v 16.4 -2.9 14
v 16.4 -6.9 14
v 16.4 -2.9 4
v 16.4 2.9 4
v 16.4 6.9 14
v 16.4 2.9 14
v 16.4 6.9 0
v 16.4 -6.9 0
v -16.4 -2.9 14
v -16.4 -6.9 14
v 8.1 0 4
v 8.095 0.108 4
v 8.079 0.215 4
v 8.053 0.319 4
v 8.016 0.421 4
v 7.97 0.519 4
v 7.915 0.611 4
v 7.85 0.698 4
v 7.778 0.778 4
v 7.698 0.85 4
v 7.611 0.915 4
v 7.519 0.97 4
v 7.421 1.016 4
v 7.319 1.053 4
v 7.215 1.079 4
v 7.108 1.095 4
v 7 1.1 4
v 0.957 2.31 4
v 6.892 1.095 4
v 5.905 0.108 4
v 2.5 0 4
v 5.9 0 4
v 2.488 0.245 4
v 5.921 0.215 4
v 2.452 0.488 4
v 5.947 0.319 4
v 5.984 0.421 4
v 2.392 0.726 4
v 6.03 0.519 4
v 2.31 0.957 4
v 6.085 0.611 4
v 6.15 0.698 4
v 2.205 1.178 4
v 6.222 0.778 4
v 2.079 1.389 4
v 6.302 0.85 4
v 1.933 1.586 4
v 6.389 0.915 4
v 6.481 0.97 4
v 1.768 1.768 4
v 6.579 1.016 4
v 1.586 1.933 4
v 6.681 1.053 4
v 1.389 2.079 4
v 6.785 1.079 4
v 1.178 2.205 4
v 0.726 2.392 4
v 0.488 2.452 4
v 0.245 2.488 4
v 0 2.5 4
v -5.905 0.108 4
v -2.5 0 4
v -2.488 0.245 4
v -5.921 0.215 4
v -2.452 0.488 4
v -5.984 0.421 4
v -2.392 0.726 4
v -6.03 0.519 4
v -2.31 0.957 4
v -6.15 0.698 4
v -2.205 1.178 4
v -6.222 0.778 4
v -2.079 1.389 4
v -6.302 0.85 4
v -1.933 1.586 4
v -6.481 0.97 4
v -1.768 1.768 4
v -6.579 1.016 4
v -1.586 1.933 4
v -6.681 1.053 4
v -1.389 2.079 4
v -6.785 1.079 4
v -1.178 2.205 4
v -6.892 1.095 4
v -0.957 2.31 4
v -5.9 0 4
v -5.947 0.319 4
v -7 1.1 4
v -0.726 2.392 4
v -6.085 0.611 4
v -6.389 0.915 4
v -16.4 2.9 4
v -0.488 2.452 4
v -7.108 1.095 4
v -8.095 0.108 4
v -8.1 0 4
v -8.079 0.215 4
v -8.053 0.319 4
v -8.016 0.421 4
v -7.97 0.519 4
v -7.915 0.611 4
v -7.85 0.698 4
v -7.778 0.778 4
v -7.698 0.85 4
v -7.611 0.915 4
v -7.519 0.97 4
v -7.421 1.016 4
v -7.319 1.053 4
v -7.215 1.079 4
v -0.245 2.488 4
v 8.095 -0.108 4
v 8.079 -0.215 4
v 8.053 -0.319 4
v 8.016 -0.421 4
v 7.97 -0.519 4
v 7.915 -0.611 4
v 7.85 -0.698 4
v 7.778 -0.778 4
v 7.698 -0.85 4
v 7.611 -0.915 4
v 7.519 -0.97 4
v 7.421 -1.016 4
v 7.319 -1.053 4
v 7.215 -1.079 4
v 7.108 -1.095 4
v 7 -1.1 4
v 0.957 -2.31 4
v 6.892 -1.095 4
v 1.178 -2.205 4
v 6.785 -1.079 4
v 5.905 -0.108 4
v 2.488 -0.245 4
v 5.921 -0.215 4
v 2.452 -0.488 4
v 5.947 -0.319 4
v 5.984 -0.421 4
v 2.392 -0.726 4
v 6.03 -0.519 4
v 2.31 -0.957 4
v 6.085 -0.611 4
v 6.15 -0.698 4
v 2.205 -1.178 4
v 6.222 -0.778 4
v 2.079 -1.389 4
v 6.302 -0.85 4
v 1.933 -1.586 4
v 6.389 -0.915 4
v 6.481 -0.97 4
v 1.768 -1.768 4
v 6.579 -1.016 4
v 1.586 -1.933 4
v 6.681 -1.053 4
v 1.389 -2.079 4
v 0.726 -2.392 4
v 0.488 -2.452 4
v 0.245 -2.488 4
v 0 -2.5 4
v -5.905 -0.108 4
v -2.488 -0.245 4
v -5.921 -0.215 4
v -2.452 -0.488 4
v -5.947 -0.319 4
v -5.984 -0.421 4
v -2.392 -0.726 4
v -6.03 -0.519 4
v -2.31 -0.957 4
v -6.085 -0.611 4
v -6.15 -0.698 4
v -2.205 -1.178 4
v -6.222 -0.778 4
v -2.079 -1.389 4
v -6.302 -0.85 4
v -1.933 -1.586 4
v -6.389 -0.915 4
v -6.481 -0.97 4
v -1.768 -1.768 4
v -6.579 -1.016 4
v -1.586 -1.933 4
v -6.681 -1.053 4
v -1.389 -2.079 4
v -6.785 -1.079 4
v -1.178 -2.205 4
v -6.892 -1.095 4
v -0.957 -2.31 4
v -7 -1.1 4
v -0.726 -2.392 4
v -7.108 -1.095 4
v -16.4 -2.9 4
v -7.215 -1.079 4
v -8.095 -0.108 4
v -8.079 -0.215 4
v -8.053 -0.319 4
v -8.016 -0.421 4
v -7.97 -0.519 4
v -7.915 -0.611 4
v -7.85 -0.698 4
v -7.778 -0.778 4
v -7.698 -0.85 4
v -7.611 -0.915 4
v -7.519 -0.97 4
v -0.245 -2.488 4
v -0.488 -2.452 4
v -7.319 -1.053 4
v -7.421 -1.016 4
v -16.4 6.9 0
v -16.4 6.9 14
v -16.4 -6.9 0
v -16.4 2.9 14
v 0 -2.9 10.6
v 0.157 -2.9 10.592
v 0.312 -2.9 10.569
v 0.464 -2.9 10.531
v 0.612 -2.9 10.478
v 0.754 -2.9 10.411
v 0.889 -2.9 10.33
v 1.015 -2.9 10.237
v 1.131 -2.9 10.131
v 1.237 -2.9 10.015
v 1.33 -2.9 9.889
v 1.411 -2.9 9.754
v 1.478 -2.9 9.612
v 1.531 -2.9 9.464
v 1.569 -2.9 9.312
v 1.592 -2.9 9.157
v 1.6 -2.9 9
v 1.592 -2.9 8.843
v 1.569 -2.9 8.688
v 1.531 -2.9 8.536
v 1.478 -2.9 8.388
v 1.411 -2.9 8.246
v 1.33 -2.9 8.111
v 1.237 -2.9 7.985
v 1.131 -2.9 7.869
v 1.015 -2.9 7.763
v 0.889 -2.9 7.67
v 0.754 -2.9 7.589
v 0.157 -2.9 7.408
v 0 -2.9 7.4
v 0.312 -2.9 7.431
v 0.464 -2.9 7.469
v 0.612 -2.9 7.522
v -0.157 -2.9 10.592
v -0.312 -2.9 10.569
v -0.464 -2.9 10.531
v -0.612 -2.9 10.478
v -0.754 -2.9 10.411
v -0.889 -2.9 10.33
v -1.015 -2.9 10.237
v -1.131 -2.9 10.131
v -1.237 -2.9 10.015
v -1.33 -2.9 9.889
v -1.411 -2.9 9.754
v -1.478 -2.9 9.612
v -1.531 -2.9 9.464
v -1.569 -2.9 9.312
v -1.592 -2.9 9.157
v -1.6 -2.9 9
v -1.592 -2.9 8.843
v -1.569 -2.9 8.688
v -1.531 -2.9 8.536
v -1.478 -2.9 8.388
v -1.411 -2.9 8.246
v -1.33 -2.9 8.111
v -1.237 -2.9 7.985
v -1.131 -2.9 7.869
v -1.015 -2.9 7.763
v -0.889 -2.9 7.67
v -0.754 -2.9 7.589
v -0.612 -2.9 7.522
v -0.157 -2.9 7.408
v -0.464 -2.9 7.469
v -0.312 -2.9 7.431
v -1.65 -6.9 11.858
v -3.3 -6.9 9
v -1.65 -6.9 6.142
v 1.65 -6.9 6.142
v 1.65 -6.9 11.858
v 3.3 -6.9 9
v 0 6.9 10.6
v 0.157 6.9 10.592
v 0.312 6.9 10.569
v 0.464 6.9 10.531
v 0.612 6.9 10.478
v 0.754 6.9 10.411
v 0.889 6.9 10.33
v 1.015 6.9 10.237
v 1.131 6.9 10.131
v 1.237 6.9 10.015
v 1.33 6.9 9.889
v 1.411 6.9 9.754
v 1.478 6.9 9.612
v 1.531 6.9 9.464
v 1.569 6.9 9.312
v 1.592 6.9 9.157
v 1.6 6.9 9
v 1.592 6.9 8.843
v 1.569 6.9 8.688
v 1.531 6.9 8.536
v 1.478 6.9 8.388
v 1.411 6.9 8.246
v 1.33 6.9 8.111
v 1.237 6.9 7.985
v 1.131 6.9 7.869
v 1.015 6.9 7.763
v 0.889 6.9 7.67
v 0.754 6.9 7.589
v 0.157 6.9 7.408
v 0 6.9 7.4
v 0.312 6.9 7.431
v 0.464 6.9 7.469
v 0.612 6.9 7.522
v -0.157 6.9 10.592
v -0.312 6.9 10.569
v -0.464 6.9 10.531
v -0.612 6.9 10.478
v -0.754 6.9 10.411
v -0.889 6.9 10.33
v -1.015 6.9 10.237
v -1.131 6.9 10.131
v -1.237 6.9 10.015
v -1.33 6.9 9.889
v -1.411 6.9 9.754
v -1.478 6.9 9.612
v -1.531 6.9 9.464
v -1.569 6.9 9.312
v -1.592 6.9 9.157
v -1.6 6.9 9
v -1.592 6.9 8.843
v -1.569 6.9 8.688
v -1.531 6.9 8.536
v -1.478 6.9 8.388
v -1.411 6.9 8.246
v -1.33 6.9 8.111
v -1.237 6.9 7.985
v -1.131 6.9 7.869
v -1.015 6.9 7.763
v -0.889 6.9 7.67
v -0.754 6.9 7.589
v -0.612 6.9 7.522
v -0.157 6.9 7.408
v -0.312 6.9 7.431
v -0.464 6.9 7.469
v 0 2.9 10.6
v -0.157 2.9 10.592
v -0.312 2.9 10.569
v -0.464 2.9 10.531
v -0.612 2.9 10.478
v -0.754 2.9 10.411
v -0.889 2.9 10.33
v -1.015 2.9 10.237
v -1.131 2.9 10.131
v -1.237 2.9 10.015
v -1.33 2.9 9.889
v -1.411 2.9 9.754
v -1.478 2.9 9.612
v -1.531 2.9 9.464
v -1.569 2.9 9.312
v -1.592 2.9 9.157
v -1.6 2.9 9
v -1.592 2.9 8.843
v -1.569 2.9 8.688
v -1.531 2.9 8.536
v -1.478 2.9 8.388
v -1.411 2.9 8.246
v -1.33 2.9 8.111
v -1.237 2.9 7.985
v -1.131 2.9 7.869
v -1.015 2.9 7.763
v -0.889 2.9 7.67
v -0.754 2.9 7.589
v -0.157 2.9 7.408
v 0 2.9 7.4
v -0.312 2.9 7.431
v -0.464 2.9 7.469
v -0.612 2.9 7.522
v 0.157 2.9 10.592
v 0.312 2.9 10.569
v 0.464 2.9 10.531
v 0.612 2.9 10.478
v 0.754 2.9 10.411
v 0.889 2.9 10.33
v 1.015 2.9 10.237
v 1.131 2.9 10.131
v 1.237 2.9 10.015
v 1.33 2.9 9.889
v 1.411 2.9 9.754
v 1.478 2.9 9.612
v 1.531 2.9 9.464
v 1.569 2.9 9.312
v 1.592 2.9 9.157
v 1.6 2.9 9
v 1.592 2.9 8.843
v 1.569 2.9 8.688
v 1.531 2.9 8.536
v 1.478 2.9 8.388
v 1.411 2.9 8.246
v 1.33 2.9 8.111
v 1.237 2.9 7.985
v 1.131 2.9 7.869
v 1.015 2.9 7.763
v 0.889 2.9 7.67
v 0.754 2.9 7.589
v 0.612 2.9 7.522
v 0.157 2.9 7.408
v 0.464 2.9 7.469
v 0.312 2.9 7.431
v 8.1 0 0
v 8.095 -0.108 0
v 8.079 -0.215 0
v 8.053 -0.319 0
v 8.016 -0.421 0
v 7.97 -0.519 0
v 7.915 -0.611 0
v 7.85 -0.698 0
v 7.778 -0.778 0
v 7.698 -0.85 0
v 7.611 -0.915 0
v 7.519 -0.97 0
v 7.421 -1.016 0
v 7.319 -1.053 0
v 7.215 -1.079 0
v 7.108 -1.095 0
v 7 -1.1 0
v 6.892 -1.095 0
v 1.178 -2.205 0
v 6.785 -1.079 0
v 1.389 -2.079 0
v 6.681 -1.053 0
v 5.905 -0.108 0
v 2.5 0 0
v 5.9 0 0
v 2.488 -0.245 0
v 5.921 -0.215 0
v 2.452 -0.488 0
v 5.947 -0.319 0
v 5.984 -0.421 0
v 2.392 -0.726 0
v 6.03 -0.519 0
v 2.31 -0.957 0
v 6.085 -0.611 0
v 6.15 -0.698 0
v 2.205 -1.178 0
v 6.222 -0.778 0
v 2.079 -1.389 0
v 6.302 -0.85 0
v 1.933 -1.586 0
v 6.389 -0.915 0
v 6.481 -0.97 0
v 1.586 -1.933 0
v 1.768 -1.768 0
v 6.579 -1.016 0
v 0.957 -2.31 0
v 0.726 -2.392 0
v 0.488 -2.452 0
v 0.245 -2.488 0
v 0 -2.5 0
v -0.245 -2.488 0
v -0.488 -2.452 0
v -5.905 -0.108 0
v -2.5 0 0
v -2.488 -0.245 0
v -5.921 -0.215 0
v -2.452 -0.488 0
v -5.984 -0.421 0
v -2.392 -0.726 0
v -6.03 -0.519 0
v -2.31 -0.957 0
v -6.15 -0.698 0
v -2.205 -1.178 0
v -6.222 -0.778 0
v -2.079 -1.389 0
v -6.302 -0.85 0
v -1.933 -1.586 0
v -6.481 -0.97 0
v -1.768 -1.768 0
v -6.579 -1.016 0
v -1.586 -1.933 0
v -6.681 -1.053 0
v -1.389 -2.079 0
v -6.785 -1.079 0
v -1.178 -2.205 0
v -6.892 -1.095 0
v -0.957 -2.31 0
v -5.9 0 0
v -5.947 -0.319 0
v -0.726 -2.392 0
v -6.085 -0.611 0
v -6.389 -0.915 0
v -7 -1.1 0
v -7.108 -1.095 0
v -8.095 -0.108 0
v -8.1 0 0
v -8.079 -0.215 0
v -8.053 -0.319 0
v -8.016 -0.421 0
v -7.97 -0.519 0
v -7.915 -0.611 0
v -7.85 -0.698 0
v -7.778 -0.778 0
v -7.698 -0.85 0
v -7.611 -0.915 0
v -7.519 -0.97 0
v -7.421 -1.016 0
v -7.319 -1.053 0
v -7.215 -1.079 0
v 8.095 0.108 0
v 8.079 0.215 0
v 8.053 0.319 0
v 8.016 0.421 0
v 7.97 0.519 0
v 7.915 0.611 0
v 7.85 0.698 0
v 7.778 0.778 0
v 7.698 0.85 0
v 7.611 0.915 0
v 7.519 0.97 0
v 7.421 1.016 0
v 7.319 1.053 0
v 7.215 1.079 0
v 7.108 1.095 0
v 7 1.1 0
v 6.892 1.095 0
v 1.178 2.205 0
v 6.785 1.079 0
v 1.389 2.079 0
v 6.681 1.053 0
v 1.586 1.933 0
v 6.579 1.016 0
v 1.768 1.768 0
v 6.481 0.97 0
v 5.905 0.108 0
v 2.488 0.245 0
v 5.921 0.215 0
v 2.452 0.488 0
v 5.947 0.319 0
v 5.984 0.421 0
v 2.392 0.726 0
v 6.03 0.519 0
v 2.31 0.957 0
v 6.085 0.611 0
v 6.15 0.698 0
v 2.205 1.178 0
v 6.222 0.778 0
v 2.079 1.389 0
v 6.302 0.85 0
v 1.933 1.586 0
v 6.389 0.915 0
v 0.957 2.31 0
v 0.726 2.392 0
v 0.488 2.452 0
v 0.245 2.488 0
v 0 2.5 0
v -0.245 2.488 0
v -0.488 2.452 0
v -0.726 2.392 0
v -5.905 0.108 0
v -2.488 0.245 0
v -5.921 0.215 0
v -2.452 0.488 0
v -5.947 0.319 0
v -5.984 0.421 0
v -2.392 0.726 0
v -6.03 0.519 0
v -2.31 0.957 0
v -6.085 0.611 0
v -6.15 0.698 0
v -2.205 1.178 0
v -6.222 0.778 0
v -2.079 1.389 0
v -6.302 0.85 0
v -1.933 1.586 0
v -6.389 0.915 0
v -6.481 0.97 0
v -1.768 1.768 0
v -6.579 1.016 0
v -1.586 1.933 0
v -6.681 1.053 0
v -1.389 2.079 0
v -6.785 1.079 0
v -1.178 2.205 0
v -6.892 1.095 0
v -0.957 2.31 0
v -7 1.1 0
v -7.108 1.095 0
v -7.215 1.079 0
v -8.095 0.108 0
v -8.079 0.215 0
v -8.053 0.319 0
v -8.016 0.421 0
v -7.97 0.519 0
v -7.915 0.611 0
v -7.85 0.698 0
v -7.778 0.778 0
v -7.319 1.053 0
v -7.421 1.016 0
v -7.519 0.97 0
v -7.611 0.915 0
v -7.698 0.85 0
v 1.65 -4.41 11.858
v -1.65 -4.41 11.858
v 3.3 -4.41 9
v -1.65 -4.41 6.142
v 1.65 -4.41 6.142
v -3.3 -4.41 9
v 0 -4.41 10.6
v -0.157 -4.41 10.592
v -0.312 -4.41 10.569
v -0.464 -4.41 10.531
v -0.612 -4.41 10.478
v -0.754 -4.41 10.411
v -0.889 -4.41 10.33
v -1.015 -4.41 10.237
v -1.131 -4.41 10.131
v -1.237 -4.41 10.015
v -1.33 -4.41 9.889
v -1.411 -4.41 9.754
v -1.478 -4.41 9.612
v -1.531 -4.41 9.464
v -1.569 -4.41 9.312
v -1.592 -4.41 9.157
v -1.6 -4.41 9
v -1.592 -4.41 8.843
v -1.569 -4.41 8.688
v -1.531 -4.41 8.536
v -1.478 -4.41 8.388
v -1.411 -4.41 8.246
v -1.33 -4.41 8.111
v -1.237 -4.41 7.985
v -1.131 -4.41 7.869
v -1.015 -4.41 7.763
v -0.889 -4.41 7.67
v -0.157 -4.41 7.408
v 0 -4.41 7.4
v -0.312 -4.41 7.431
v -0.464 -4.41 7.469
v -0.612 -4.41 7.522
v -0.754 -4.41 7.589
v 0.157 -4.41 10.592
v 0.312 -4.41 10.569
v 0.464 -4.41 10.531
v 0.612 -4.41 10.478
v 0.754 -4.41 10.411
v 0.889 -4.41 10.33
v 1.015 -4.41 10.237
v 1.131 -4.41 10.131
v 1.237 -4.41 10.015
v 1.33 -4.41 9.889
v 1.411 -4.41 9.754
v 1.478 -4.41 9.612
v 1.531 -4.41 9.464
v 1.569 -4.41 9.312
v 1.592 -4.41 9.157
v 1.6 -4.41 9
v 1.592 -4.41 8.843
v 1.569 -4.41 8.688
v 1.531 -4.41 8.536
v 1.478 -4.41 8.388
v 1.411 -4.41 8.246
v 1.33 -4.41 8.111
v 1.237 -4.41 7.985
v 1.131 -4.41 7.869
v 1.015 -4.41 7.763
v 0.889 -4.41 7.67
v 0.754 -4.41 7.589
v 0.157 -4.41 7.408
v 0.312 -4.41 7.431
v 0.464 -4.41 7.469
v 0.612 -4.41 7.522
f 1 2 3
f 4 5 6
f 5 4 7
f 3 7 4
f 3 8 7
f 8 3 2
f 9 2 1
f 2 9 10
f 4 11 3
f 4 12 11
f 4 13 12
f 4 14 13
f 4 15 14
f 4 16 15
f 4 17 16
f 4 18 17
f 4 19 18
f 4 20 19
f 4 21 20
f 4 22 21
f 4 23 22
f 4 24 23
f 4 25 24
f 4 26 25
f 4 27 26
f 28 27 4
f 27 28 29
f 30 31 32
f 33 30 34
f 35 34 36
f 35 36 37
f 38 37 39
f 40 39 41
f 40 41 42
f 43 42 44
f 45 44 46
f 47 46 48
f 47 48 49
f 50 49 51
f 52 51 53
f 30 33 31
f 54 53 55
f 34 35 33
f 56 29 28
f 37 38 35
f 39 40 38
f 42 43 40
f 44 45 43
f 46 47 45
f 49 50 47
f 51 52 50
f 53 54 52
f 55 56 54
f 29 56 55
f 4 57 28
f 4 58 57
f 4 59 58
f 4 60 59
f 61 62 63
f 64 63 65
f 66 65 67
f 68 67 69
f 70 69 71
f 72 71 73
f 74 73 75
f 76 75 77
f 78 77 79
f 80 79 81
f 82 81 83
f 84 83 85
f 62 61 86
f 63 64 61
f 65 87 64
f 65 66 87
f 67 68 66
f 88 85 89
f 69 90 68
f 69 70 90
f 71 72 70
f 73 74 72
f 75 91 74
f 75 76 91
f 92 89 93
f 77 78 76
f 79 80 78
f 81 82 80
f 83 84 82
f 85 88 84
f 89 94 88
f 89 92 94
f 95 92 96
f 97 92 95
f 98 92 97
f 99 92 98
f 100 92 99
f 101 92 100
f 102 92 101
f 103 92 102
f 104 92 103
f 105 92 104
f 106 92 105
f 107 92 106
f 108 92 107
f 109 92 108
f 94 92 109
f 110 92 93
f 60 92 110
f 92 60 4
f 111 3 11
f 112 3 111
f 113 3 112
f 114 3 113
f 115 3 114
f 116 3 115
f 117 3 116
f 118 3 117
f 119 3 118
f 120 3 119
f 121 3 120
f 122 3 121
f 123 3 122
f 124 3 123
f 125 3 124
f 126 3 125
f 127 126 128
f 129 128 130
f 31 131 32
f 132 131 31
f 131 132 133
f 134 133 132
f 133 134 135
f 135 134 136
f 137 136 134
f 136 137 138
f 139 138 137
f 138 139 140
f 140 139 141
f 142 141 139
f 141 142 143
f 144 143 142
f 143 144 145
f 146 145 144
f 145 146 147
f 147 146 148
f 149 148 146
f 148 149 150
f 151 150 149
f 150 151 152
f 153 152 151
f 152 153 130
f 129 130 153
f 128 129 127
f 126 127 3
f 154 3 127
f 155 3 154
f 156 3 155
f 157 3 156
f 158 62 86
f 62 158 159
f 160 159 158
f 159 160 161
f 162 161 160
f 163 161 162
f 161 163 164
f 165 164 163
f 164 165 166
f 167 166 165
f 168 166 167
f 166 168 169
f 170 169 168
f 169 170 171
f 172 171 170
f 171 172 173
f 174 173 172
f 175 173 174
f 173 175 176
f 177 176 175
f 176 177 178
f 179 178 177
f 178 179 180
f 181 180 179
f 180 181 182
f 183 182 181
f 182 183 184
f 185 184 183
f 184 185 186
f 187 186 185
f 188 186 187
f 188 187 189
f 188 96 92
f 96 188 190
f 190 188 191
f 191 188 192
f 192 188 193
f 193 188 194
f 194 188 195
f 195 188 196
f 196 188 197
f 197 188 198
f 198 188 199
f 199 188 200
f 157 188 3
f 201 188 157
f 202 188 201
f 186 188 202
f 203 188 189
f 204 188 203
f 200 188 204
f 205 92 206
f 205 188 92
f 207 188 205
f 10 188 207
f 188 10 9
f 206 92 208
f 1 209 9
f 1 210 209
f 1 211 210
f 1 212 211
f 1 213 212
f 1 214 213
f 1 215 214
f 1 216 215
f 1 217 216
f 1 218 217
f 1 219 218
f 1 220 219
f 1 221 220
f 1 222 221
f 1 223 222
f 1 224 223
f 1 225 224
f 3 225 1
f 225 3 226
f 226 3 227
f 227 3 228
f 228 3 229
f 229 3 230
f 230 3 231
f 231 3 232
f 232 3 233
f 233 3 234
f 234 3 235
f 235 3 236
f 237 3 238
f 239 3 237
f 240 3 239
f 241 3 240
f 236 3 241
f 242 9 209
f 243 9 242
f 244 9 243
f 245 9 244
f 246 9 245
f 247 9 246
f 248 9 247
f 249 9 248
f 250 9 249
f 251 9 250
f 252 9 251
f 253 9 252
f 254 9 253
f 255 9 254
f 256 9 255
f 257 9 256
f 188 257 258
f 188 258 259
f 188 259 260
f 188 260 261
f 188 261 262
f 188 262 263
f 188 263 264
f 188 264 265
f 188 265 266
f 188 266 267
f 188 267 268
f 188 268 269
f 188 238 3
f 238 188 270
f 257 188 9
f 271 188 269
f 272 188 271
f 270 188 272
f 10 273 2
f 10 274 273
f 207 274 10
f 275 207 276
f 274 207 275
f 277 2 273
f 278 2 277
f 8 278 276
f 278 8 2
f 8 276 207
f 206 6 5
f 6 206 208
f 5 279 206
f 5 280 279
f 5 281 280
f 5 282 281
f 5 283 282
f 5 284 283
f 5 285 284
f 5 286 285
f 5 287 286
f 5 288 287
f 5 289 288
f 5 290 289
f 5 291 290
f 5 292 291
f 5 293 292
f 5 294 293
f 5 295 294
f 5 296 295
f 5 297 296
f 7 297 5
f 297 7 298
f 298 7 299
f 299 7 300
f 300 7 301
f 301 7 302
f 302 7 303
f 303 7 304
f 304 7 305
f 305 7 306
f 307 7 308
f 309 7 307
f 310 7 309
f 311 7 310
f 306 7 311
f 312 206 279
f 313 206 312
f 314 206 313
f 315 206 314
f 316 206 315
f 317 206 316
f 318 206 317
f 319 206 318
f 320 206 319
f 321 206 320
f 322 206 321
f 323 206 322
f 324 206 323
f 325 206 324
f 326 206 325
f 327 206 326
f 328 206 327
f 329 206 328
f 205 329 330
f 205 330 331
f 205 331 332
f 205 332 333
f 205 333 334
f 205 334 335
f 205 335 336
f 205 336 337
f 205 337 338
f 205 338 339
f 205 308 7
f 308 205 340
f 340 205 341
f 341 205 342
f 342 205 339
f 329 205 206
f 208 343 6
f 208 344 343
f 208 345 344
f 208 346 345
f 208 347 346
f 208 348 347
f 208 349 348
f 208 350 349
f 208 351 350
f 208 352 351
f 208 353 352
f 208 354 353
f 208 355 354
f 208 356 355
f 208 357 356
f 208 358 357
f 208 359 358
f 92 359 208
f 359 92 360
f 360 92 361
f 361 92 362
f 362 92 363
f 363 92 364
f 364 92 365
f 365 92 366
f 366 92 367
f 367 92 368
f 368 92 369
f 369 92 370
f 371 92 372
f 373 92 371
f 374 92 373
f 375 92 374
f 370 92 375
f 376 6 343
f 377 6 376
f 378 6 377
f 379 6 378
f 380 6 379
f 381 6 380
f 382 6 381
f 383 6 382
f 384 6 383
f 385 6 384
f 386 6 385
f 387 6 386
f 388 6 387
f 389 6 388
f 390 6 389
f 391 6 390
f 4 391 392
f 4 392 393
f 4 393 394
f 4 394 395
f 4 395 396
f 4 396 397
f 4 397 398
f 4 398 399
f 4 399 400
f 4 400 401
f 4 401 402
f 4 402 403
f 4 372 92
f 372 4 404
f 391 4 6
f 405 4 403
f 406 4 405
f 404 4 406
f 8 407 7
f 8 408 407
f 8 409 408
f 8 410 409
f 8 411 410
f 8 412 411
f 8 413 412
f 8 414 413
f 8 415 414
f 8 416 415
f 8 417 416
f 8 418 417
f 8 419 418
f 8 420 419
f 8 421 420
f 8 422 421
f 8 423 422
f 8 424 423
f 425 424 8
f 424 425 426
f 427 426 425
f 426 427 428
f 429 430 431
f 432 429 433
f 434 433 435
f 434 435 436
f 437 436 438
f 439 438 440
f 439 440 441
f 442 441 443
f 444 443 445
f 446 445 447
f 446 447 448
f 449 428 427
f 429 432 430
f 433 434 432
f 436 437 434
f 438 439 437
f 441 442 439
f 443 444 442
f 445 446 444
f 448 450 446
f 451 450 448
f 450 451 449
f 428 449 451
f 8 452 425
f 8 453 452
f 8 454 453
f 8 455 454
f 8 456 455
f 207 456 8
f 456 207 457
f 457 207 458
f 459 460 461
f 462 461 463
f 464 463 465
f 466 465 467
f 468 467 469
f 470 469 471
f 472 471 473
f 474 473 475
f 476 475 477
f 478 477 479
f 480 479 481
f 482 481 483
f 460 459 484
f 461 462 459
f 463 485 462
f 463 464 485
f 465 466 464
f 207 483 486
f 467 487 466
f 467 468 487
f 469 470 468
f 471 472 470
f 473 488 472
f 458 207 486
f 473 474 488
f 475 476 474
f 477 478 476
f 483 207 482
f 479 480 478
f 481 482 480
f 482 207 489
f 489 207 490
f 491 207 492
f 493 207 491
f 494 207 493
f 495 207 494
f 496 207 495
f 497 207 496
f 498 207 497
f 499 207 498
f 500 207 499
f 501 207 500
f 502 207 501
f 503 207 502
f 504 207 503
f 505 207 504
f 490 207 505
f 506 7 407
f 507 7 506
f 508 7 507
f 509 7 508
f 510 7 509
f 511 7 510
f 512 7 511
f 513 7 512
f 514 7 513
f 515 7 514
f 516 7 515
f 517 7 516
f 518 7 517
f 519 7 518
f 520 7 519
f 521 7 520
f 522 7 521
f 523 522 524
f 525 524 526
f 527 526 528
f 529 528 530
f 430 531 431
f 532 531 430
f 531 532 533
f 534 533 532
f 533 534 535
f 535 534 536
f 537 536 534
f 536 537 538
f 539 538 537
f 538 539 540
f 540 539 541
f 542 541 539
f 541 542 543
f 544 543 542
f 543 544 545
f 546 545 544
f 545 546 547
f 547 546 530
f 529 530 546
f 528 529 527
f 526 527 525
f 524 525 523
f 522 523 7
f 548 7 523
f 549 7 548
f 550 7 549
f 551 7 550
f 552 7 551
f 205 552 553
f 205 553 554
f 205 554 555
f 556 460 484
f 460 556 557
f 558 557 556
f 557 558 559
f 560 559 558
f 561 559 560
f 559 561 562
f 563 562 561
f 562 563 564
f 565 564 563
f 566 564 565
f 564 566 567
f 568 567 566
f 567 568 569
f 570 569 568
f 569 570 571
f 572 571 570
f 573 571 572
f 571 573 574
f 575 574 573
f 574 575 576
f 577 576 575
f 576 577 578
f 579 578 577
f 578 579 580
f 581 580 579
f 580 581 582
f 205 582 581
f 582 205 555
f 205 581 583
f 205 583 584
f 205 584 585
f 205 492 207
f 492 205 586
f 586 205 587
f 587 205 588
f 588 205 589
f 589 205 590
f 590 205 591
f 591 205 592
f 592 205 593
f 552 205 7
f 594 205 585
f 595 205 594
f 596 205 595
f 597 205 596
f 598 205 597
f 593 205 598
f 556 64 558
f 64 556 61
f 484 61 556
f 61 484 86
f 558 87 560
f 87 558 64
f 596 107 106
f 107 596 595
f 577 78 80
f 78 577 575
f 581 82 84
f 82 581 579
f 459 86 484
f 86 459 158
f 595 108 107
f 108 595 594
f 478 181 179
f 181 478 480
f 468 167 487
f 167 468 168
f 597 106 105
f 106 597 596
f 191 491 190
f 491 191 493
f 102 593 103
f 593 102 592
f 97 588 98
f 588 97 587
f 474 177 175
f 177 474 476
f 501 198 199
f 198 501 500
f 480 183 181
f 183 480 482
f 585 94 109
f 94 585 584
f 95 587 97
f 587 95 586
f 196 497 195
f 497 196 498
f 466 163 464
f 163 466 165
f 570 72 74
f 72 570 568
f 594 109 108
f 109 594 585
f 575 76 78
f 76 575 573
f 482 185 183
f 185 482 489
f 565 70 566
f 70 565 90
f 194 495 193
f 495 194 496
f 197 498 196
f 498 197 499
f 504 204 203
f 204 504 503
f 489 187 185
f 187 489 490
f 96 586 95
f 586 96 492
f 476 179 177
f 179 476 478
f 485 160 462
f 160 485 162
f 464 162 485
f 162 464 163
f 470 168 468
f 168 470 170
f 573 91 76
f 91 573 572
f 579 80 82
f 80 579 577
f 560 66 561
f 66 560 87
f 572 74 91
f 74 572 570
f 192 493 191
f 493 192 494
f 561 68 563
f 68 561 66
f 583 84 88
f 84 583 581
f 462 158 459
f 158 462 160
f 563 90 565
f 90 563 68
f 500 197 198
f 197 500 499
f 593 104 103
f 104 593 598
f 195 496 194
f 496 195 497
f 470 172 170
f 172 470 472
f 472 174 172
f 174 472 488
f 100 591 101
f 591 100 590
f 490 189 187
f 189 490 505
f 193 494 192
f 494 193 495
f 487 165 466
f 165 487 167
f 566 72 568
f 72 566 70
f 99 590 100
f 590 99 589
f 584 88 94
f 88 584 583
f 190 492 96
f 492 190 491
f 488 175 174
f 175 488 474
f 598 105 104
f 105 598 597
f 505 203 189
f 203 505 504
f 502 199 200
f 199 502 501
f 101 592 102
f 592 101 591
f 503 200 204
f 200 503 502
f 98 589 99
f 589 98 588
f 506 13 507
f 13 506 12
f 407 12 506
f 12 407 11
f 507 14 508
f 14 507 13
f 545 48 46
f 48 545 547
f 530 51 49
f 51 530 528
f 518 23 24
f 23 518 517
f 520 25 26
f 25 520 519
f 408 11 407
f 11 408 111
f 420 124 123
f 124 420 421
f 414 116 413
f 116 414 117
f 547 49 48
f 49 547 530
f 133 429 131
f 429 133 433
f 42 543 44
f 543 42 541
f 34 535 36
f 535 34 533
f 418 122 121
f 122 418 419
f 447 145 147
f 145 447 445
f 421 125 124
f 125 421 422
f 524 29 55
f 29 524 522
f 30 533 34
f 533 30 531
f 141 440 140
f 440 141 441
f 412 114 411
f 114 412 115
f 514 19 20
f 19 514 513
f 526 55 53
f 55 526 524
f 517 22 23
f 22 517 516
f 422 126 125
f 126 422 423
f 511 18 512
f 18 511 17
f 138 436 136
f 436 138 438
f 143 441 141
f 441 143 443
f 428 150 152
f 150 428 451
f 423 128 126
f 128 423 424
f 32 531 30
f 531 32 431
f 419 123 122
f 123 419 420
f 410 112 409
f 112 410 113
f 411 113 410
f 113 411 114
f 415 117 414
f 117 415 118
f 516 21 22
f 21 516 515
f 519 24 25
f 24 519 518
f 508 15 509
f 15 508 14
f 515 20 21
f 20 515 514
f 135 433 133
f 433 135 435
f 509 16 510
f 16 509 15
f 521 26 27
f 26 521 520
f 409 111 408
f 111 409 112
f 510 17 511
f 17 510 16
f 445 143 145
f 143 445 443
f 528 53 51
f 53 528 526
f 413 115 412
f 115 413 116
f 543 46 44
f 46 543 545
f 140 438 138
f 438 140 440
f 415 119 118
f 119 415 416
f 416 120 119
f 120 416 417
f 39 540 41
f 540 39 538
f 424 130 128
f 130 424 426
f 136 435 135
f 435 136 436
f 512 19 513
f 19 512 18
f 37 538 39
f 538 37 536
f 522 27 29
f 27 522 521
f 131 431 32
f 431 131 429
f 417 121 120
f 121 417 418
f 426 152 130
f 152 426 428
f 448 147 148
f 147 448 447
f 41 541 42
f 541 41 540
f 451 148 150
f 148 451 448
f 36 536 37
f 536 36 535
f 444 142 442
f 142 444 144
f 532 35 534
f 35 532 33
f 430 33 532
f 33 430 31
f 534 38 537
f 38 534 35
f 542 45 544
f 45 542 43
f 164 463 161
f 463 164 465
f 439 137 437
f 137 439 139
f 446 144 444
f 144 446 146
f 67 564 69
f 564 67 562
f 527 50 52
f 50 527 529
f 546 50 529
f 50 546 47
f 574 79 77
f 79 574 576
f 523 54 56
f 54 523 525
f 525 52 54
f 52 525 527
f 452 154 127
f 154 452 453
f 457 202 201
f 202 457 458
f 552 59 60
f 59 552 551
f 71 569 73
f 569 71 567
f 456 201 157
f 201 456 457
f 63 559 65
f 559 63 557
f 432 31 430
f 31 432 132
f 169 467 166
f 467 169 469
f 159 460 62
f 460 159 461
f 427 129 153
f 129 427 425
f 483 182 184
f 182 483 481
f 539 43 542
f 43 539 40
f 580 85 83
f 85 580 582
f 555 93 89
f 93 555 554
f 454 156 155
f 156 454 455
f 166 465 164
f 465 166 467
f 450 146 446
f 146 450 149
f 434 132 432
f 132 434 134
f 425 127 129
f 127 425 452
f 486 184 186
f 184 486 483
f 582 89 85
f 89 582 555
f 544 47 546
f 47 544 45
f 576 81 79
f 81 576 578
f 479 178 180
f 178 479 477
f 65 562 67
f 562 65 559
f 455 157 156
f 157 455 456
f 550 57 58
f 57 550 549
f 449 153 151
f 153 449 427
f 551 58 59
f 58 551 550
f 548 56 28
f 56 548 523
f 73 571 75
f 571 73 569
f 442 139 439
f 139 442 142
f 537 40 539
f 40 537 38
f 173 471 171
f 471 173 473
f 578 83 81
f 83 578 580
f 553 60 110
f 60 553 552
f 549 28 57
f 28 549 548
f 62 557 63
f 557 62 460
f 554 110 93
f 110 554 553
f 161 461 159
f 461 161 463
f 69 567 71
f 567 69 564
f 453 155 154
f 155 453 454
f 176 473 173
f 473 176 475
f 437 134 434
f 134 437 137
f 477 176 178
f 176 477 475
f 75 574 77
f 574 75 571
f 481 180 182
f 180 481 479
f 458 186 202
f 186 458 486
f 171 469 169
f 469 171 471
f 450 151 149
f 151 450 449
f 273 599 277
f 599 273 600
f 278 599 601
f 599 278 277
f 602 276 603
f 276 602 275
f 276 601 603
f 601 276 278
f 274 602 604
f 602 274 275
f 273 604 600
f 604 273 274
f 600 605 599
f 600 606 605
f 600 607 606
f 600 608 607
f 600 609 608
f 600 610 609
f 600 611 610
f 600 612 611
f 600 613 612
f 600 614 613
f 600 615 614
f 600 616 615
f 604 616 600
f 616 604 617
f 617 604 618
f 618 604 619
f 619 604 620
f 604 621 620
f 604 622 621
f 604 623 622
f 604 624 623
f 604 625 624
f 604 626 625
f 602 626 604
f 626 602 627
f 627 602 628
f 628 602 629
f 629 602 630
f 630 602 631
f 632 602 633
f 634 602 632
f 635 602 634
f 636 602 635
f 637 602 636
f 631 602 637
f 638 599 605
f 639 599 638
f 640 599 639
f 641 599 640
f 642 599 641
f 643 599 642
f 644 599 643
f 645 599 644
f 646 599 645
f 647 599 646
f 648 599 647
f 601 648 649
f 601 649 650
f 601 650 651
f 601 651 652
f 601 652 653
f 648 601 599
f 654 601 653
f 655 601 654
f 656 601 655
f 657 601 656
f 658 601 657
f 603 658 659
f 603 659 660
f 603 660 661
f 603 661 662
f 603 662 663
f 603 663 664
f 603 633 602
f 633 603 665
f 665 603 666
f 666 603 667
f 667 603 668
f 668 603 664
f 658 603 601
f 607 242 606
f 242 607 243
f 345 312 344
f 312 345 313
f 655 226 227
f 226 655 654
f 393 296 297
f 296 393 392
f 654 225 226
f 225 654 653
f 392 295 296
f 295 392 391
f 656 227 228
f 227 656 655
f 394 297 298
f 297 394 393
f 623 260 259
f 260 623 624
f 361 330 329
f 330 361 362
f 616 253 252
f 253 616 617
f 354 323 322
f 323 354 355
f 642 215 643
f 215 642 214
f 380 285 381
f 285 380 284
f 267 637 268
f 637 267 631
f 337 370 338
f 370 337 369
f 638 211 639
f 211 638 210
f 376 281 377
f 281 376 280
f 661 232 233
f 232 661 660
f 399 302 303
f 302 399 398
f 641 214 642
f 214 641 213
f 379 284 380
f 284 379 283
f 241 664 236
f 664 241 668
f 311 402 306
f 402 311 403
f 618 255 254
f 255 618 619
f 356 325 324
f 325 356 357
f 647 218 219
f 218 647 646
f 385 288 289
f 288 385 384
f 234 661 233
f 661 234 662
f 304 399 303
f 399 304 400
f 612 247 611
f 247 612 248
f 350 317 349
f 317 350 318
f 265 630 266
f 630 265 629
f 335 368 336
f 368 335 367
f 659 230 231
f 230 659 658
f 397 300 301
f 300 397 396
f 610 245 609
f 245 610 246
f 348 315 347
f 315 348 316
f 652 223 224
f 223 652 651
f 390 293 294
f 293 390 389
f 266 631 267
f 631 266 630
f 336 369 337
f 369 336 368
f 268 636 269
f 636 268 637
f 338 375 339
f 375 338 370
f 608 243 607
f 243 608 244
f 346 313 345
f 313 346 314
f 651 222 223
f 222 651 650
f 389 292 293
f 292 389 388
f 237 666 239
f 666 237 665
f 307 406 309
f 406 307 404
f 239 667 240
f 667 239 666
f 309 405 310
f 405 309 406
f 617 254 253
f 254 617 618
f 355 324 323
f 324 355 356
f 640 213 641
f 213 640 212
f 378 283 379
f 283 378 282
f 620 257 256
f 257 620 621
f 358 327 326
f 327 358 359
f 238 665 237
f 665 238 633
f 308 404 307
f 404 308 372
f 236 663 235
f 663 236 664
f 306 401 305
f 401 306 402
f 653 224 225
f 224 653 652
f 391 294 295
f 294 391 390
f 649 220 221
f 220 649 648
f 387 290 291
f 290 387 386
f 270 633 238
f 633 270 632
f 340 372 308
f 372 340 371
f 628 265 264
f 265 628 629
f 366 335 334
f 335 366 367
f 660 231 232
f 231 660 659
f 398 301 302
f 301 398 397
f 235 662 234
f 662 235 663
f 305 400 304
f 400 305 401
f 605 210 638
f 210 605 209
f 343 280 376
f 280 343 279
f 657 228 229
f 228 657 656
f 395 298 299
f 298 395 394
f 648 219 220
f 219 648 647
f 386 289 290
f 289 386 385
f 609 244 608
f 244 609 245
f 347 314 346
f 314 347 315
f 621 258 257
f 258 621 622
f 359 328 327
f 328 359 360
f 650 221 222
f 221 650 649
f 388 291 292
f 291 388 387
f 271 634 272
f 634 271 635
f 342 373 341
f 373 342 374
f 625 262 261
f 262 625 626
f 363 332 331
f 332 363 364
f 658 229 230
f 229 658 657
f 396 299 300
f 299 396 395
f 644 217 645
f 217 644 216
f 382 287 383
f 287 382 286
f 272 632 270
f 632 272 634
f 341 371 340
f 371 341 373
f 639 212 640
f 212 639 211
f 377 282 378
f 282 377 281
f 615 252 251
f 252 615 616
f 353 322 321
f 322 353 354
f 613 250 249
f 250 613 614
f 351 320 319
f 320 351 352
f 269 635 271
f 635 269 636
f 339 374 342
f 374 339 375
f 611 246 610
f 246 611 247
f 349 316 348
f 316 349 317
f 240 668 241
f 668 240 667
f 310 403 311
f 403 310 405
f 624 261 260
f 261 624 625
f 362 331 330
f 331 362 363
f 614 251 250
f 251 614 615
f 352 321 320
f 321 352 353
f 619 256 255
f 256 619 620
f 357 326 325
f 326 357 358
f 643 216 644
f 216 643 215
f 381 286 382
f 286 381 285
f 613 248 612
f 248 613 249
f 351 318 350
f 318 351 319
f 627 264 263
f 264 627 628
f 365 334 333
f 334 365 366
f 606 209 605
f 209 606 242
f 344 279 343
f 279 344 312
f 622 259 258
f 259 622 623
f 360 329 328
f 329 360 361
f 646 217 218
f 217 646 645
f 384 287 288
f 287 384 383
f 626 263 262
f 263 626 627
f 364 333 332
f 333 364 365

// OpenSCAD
// mm. Prototipo de horquilla sobre maneta, NO estriado de servo.
// Usa el horn original del servo, atornillado a la placa superior.
// Confirmar estas medidas con calibrador antes de fabricar seis unidades.
$fn=64;
maneta_largo=24; maneta_ancho=5; holgura_total=0.8;
altura_mordaza=10; placa=4; pared=4;
agujero_horn=2.2; separacion_horn=14; acceso_central=5;
L=maneta_largo+holgura_total+2*pared;
W=maneta_ancho+holgura_total+2*pared;
difference(){
 union(){
  // placa en cama, mordazas hacia arriba: sin soportes
  translate([-L/2,-W/2,0]) cube([L,W,placa]);
  for(s=[-1,1]) translate([-L/2,s*(maneta_ancho+holgura_total)/2-(s<0?pared:0),placa])
   cube([L,pared,altura_mordaza]);
 }
 cylinder(h=placa+1,d=acceso_central);
 for(x=[-separacion_horn/2,separacion_horn/2])
  translate([x,0,-1]) cylinder(h=placa+2,d=agujero_horn);
 // alojamiento hexagonal para tuerca M3; tornillo corto presiona la maneta
 translate([0,-W/2-0.01,placa+altura_mordaza/2]) rotate([-90,0,0]) cylinder(h=2.5,d=6.6,$fn=6);
 // paso del tornillo M3
 translate([0,-W,placa+altura_mordaza/2]) rotate([-90,0,0]) cylinder(h=2*W,d=3.2);
}
